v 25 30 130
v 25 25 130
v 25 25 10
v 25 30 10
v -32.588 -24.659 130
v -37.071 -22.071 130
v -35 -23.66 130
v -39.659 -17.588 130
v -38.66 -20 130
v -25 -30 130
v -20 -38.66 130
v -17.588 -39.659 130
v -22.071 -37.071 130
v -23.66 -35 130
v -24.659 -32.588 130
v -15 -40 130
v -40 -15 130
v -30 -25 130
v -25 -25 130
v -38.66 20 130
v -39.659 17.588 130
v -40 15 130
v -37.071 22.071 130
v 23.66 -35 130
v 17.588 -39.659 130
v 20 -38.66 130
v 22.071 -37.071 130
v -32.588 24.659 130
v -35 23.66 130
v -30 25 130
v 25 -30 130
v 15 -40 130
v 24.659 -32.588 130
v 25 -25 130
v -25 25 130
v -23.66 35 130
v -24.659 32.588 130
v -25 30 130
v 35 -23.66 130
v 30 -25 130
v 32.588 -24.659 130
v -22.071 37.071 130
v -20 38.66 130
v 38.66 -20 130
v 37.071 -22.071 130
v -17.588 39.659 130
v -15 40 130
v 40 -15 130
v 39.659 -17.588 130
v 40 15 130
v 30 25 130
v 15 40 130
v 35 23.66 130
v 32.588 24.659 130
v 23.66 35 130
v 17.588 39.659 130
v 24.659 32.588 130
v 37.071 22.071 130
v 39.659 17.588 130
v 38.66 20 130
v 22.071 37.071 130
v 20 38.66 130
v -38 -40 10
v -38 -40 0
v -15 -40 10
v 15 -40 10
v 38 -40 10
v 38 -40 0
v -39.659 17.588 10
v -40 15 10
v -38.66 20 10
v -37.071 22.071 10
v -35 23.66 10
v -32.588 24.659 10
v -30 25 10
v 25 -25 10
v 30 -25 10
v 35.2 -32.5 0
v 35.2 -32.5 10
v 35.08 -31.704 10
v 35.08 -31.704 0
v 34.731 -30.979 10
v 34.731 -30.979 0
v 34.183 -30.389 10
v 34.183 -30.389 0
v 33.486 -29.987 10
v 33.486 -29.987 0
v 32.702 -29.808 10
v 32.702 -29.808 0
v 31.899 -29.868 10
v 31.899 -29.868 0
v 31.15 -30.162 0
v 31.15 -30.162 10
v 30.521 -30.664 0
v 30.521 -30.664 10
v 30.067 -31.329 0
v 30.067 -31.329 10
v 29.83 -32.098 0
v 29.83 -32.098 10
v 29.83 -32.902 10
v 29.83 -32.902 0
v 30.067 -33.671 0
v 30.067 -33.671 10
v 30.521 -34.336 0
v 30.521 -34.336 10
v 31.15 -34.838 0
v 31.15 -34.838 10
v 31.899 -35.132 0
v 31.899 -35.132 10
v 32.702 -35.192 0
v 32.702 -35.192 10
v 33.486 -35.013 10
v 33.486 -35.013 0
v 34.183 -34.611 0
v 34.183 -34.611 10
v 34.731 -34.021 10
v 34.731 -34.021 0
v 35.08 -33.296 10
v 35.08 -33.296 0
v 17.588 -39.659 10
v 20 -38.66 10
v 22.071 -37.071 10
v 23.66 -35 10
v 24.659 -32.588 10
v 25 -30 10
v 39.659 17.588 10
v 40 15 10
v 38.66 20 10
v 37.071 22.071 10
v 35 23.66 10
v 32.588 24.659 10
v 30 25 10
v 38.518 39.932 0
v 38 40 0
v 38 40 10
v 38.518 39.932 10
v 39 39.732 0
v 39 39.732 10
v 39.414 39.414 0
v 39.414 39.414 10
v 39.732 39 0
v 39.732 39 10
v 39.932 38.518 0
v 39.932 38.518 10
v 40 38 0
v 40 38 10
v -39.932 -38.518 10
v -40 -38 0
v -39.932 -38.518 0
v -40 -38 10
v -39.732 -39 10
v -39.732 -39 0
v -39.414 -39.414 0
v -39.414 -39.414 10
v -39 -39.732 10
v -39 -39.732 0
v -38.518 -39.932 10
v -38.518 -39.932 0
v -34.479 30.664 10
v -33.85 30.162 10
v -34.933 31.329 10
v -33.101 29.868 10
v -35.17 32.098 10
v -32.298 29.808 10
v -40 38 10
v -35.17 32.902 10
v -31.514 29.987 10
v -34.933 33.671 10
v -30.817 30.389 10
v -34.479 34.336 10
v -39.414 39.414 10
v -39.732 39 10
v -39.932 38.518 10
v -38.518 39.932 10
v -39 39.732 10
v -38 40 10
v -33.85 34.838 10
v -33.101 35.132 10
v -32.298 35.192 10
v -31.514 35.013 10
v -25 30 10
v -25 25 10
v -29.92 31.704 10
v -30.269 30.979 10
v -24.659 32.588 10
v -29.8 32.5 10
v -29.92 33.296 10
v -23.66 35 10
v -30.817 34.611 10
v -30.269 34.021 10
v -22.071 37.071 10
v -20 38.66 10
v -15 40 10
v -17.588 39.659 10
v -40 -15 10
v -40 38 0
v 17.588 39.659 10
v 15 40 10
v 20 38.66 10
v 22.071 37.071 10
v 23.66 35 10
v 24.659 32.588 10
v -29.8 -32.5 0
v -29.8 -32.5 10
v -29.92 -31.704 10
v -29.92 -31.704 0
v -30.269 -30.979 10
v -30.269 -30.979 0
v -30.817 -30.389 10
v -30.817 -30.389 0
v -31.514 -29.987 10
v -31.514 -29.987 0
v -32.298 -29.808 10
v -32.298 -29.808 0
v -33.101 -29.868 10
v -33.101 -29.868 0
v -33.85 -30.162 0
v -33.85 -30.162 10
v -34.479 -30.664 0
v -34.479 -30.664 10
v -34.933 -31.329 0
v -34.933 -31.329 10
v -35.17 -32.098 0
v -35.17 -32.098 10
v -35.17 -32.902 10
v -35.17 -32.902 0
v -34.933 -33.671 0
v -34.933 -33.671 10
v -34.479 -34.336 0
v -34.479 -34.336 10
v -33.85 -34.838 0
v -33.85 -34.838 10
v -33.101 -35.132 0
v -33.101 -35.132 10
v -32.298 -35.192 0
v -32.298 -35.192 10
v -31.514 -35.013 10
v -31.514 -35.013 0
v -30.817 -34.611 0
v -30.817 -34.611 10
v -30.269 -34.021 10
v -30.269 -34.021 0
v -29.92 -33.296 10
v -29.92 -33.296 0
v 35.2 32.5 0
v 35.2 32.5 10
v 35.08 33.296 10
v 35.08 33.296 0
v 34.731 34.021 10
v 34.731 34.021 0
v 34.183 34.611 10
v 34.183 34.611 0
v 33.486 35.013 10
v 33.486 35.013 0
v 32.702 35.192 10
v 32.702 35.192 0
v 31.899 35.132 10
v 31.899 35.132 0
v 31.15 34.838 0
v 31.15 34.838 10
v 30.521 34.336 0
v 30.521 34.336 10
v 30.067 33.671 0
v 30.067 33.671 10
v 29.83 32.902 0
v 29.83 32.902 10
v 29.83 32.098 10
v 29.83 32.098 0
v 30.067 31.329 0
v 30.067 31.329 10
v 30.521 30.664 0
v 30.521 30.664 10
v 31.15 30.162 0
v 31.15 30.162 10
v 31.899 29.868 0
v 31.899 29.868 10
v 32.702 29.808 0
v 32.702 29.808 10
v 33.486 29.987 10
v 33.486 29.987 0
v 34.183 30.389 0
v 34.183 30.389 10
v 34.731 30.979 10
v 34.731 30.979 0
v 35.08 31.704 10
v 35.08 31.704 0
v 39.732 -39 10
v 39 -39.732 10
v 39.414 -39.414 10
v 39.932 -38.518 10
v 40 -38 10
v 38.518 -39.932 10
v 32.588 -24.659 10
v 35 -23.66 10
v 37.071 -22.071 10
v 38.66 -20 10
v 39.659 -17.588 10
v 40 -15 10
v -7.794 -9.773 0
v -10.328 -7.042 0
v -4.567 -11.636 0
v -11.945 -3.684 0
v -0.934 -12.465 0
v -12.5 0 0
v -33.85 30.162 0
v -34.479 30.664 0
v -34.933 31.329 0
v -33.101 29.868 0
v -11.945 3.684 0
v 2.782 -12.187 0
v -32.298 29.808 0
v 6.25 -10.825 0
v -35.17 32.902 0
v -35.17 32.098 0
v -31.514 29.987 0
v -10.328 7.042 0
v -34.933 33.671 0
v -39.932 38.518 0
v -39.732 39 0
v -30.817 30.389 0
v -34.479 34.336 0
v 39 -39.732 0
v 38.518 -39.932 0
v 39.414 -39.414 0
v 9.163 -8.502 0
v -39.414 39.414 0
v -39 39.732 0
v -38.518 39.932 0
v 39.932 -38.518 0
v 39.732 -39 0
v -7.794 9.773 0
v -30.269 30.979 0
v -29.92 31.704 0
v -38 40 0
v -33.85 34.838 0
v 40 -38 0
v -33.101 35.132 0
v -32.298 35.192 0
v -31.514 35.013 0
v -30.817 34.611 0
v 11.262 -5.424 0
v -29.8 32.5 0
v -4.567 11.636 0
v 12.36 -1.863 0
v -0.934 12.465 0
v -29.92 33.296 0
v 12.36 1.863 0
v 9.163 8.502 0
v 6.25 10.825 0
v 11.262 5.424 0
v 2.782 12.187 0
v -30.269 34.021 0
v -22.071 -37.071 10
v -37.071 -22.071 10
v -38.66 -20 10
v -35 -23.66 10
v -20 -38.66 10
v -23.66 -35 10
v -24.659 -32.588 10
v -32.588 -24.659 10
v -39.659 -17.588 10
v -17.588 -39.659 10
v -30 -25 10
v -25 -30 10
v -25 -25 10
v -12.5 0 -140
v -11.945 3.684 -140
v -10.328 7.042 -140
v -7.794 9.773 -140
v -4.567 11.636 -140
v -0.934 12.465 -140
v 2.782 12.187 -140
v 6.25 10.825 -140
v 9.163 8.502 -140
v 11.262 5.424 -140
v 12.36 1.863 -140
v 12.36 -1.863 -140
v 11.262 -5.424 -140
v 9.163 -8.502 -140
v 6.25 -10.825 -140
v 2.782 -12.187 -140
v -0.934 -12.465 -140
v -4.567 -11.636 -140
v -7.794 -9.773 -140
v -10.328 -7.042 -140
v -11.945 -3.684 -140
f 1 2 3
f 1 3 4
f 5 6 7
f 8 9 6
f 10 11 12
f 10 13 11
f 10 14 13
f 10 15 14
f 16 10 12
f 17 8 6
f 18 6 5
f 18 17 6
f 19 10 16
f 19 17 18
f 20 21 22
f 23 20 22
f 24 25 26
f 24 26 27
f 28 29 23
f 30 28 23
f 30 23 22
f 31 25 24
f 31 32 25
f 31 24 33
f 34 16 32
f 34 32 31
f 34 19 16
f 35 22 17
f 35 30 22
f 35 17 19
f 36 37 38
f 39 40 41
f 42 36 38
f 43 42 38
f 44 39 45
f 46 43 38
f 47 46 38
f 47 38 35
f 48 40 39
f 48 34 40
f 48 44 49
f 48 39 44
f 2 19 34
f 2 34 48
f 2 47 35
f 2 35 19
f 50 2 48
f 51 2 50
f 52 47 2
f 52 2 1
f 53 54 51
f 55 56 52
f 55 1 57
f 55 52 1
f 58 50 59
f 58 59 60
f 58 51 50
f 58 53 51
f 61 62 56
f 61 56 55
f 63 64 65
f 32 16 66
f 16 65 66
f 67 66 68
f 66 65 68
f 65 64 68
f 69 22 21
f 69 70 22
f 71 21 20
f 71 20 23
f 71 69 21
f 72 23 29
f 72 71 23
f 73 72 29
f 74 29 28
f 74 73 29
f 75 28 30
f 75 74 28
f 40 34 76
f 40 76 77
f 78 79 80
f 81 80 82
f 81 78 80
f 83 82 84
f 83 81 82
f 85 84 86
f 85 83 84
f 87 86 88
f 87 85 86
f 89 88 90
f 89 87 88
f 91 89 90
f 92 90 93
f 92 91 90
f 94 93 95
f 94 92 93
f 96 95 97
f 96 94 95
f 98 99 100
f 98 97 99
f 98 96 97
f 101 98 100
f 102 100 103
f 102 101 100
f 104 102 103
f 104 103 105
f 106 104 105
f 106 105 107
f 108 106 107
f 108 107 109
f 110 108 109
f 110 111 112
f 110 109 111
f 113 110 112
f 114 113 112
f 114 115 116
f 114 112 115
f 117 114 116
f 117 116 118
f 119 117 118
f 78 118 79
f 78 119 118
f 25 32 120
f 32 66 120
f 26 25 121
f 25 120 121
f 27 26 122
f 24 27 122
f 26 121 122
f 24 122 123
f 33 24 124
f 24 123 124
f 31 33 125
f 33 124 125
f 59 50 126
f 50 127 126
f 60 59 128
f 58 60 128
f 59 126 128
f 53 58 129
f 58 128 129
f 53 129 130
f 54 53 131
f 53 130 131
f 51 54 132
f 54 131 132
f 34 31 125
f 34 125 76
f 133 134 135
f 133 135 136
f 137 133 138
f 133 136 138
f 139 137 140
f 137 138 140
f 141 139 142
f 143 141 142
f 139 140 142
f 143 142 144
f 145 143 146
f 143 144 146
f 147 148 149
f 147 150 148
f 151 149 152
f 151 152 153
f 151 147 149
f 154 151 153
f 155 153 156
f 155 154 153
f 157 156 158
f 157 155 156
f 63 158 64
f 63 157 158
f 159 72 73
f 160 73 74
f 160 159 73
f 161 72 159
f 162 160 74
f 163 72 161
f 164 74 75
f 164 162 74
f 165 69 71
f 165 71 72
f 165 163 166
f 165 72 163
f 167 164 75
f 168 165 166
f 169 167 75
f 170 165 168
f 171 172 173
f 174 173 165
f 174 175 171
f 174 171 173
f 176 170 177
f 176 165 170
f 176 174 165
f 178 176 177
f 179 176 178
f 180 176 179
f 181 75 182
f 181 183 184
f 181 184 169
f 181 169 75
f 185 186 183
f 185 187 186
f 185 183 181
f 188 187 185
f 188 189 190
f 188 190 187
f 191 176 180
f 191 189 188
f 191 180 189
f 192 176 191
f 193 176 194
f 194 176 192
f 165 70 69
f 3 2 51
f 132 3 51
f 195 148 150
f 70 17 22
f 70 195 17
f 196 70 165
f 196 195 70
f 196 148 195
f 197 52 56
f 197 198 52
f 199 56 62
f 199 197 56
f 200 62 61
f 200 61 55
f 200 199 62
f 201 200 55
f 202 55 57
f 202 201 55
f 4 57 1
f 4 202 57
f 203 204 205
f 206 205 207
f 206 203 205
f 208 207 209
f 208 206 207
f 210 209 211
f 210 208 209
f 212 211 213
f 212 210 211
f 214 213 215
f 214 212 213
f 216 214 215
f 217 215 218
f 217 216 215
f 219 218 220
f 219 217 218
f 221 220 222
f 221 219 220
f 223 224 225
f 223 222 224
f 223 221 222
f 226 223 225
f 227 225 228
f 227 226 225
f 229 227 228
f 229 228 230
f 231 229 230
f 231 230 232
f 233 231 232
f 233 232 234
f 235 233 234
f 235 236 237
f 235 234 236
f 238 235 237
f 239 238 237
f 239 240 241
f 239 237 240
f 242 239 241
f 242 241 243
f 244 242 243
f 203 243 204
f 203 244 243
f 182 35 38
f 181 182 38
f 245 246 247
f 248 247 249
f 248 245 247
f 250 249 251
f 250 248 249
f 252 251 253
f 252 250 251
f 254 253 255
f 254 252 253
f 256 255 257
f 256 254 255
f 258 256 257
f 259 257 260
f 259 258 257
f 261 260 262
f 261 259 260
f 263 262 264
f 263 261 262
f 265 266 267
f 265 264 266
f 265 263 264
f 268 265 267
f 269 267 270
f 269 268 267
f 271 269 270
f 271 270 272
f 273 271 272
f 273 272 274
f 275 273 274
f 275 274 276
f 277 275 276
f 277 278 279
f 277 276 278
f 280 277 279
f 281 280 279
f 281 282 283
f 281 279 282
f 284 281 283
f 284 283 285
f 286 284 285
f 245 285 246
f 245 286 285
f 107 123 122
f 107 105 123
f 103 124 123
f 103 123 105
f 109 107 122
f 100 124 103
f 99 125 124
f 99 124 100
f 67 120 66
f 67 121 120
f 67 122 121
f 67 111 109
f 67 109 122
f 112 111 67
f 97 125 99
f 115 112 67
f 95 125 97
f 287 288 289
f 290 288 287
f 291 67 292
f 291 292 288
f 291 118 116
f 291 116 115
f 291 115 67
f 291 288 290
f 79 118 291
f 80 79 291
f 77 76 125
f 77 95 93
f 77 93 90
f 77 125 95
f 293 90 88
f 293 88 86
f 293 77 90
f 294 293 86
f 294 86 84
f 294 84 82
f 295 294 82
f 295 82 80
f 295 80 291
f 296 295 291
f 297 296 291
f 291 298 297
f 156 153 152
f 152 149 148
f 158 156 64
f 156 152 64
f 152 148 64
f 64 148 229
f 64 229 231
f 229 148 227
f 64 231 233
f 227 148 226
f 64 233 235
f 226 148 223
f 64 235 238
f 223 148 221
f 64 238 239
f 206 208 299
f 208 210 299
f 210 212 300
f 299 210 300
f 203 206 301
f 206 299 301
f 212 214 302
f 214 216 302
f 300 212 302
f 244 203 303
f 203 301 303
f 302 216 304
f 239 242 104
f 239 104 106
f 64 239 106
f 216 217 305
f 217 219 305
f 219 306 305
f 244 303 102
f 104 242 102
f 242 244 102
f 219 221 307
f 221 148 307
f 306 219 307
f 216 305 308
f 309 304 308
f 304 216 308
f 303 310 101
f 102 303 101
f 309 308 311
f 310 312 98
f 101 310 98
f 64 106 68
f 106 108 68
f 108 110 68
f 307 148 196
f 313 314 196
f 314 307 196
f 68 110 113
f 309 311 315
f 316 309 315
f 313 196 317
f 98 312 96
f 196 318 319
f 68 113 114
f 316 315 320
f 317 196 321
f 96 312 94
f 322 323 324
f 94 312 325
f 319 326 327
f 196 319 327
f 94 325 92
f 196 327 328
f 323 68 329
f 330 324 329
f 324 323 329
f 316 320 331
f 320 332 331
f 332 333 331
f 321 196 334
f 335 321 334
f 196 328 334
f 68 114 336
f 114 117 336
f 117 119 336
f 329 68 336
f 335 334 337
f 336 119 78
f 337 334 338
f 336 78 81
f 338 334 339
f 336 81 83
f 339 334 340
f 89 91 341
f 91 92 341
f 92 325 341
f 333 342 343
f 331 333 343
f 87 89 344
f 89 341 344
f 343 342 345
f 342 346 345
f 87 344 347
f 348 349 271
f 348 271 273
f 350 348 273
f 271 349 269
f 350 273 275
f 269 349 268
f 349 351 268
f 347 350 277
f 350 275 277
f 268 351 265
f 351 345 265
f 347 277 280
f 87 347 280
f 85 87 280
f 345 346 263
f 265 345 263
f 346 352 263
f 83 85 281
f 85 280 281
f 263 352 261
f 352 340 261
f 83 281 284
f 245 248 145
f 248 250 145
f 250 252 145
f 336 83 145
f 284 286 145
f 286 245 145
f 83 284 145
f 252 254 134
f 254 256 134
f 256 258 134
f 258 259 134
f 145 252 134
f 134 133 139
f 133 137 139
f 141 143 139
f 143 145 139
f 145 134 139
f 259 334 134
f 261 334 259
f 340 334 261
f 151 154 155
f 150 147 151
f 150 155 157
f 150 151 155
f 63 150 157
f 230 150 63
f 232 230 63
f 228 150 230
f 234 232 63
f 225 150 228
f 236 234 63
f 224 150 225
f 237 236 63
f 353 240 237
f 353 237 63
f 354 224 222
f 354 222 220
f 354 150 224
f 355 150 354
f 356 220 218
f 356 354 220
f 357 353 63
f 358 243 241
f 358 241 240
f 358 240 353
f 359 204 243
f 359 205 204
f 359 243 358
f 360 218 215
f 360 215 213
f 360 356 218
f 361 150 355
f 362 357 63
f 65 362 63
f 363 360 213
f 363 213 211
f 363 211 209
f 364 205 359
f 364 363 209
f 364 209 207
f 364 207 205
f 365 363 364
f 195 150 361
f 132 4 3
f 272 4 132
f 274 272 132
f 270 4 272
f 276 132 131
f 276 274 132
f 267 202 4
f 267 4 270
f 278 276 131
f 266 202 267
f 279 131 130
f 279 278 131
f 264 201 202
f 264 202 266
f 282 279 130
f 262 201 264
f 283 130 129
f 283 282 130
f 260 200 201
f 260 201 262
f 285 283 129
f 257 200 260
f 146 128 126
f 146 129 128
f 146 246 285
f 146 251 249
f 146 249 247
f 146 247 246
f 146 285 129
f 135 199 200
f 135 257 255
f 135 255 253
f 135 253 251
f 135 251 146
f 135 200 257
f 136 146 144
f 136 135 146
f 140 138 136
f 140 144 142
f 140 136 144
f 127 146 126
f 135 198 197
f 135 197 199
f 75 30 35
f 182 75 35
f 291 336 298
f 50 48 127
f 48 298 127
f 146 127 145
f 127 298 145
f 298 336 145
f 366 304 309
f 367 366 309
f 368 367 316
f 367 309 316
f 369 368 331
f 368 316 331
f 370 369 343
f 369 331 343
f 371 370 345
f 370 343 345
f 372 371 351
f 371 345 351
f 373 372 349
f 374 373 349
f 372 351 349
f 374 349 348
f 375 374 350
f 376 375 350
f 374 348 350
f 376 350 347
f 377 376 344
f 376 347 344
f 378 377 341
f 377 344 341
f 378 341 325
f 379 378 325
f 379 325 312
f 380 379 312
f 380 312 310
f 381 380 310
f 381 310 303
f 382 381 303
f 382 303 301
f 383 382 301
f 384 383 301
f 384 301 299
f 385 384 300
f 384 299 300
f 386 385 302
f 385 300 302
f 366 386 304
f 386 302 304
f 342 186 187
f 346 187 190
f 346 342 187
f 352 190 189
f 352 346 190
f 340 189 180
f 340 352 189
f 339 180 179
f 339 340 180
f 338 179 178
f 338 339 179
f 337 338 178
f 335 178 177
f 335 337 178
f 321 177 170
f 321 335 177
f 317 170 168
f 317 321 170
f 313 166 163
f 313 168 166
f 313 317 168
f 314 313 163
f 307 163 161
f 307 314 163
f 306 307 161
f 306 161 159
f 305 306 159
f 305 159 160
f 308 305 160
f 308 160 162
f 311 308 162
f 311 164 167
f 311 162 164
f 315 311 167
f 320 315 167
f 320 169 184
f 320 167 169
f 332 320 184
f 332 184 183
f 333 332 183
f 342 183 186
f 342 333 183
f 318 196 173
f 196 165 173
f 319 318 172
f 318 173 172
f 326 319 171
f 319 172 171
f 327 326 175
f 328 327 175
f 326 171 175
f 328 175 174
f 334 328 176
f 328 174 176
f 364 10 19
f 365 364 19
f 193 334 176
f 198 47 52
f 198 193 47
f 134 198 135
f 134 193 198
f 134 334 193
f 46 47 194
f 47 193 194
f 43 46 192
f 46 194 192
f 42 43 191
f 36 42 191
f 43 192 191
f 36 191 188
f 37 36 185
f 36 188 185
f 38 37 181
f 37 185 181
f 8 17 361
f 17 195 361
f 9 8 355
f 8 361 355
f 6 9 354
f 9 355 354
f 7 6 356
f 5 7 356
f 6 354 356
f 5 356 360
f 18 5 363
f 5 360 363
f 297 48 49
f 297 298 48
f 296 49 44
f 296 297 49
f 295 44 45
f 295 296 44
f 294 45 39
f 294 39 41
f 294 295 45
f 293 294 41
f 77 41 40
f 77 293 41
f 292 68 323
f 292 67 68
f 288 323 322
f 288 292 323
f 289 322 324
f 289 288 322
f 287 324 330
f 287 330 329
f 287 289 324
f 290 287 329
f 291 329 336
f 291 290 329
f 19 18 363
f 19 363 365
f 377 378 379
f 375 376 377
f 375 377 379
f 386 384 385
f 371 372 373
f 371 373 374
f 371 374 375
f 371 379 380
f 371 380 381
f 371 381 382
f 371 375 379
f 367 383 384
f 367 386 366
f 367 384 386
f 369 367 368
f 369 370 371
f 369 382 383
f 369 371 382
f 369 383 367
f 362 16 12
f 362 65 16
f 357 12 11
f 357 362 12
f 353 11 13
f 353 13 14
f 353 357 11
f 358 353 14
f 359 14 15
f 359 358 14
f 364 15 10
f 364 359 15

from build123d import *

# Parameters (mm, degrees)
SKETCH_1_W          = 80
SKETCH_1_H          = 80
SKETCH_1_R          = 2.7
EXTRUDE_1_DEPTH     = 130
SKETCH_2_R          = 12.5
EXTRUDE_2_DEPTH     = 140
SKETCH_3_W          = 15
SKETCH_3_H          = 15
CUT_EXTRUDE_1_DEPTH = 120
FILLET_1_R          = 2
FILLET_3_R          = 10


with BuildPart() as part:
    # 草图1 → 凸台-拉伸1 (new body)
    with BuildSketch(Plane.XY):
        Rectangle(SKETCH_1_W, SKETCH_1_H)
        with Locations((-32.5, 32.5)):
            Circle(SKETCH_1_R, mode=Mode.SUBTRACT)
        with Locations((32.5, 32.5)):
            Circle(SKETCH_1_R, mode=Mode.SUBTRACT)
        with Locations((32.5, -32.5)):
            Circle(SKETCH_1_R, mode=Mode.SUBTRACT)
        with Locations((-32.5, -32.5)):
            Circle(SKETCH_1_R, mode=Mode.SUBTRACT)
    extrude(amount=EXTRUDE_1_DEPTH)

    # 草图2 → 凸台-拉伸2 (add)
    with BuildSketch(Plane(origin=(0, 0, 0), x_dir=(-1, 0, 0), z_dir=(0, 0, -1))):
        Circle(SKETCH_2_R)
    extrude(amount=EXTRUDE_2_DEPTH)

    # 草图3 → 切除-拉伸1 (cut)
    with BuildSketch(Plane.XY.offset(130)):
        with Locations((-32.5, 32.5)):
            Rectangle(SKETCH_3_W, SKETCH_3_H)
        with Locations((32.5, 32.5)):
            Rectangle(SKETCH_3_W, SKETCH_3_H)
        with Locations((32.5, -32.5)):
            Rectangle(SKETCH_3_W, SKETCH_3_H)
        with Locations((-32.5, -32.5)):
            Rectangle(SKETCH_3_W, SKETCH_3_H)
    extrude(amount=-CUT_EXTRUDE_1_DEPTH, mode=Mode.SUBTRACT)

    # 圆角1
    fillet_1_edges = [part.edges().sort_by_distance(p)[0] for p in [
        (40, -40, 5),
        (-40, -40, 5),
        (-40, 40, 5),
        (40, 40, 5),
    ]]
    fillet(fillet_1_edges, radius=FILLET_1_R)

    # 圆角3
    fillet_3_edges = [part.edges().sort_by_distance(p)[0] for p in [
        (-25, -40, 70),
        (-40, -25, 70),
        (40, -25, 70),
        (25, -40, 70),
        (25, 40, 70),
        (40, 25, 70),
        (-40, 25, 70),
        (-25, 40, 70),
    ]]
    fillet(fillet_3_edges, radius=FILLET_3_R)


solid = part.part
